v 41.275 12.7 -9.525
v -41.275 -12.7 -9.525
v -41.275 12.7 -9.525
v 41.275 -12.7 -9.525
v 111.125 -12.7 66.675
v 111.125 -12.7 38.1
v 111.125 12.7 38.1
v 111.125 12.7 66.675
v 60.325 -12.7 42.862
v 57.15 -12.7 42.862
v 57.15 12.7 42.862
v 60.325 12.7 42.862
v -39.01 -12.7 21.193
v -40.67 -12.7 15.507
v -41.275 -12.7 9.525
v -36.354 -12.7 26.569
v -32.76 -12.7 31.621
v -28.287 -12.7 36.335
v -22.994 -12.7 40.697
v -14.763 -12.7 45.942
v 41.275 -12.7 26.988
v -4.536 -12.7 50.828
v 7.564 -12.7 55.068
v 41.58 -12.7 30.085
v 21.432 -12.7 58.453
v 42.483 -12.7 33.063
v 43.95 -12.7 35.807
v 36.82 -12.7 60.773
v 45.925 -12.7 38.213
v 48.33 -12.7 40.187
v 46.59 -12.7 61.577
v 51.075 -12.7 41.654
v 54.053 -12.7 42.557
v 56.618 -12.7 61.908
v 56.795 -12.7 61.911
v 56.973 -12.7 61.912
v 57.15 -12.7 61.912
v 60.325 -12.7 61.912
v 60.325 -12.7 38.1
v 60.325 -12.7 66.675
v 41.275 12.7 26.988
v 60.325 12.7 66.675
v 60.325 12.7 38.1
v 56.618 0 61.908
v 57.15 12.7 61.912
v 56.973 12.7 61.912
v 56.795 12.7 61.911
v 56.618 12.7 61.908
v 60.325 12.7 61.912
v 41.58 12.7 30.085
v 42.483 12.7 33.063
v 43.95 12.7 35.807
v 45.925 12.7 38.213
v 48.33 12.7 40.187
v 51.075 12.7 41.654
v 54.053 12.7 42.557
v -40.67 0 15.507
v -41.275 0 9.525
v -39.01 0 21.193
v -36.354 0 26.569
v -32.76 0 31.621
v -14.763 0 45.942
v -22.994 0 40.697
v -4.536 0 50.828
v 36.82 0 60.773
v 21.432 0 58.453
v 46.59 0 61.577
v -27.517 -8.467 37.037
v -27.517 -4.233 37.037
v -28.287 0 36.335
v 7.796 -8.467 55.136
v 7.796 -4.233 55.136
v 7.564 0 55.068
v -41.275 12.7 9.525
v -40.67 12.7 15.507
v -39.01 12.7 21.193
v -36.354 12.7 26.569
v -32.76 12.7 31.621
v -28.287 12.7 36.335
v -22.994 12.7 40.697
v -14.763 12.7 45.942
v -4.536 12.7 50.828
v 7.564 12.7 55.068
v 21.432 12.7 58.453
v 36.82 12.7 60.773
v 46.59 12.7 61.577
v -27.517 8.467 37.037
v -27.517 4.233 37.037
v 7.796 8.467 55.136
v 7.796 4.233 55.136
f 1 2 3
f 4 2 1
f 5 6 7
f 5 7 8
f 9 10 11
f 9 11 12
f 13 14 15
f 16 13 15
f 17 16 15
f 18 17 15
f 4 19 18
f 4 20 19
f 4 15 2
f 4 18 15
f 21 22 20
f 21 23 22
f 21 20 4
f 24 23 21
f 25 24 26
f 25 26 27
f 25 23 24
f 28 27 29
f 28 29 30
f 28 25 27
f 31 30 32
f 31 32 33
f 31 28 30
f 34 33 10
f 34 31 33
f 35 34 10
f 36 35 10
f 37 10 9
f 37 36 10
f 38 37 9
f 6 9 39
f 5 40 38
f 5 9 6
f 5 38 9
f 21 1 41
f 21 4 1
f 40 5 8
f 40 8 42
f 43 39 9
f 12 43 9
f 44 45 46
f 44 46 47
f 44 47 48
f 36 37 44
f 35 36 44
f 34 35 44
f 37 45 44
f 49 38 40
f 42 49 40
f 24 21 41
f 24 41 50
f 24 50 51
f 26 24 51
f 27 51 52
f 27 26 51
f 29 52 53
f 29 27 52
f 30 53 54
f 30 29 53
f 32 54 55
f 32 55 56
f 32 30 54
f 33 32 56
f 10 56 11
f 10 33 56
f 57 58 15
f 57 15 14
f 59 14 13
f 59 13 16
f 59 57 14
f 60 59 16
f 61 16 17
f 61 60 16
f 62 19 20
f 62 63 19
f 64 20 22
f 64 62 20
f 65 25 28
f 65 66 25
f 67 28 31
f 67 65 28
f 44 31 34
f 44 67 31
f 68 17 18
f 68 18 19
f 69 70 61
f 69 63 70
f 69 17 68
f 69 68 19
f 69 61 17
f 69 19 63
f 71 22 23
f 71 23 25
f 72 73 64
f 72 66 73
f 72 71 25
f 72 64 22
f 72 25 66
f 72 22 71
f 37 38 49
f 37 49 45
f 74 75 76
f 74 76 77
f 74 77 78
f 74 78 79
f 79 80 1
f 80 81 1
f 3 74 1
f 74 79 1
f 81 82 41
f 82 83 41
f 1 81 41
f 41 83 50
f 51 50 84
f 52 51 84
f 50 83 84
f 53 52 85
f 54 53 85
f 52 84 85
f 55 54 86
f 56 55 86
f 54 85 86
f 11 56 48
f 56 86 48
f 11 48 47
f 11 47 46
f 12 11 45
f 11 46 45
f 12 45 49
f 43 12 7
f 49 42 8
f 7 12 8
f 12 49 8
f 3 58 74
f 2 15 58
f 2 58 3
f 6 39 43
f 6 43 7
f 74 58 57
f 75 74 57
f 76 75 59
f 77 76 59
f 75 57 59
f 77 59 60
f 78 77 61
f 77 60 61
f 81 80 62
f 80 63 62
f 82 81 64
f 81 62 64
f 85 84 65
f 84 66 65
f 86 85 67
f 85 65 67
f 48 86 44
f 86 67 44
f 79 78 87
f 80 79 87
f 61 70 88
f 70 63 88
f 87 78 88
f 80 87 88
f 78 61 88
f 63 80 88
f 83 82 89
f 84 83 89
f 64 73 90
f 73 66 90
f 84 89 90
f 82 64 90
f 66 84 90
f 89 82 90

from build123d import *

# Parameters (mm, degrees)
F0_W     = 25.4
F0_H     = 4.7625
F0_H_2   = 19.05
F1_DEPTH = 12.7


with BuildPart() as f1:
    # F0 (on Front) → F1 (new body, symmetric)
    with BuildSketch(Plane.XZ):
        Polygon((41.275, -9.525), (41.275, 9.525), (22.225, 9.525), (-41.275, 9.525), (-41.275, -9.525), align=None)
        with BuildLine():
            Line((22.225, 9.525), (41.275, 9.525))
            Line((41.275, 9.525), (41.275, 26.9875))
            ThreePointArc((41.275, 26.9875), (45.9246798487, 38.2128201513), (57.15, 42.8625))
            Line((57.15, 42.8625), (60.325, 42.8625))
            Line((60.325, 42.8625), (60.325, 61.9125))
            Line((60.325, 61.9125), (57.15, 61.9125))
            add(Edge.make_bspline(
                [(56.6181319004, 61.9084498915), (56.7953297588, 61.9100229776), (56.9726195791, 61.9113731218), (57.15, 61.9125)],
                knots=[111.1262909872, 111.1262909872, 111.1262909872, 111.1262909872, 111.4985685166, 111.4985685166, 111.4985685166, 111.4985685166], degree=3))
            ThreePointArc((56.6181319004, 61.9084498915), (32.2669624204, 51.4944391359), (22.225, 26.9875))
            Line((22.225, 26.9875), (22.225, 9.525))
        make_face()
        with BuildLine():
            Line((-41.275, 9.525), (22.225, 9.525))
            Line((22.225, 9.525), (22.225, 26.9875))
            ThreePointArc((22.225, 26.9875), (32.2669624204, 51.4944391359), (56.6181319004, 61.9084498915))
            add(Edge.make_bspline(
                [(-41.275, 9.525), (-40.9761398409, 41.1041646748), (3.723881742, 61.4388775764), (56.6181319004, 61.9084498915)],
                knots=[0, 0, 0, 0, 111.1262909872, 111.1262909872, 111.1262909872, 111.1262909872], degree=3))
        make_face()
        with BuildLine():
            ThreePointArc((57.15, 61.9125), (56.8840582401, 61.9114874582), (56.6181319004, 61.9084498915))
            add(Edge.make_bspline(
                [(56.6181319004, 61.9084498915), (56.7953297588, 61.9100229776), (56.9726195791, 61.9113731218), (57.15, 61.9125)],
                knots=[111.1262909872, 111.1262909872, 111.1262909872, 111.1262909872, 111.4985685166, 111.4985685166, 111.4985685166, 111.4985685166], degree=3))
        make_face()
        with Locations((73.025, 40.48125)):
            Rectangle(F0_W, F0_H)
        with Locations((73.025, 52.3875)):
            Rectangle(F0_W, F0_H_2)
        with Locations((73.025, 64.29375)):
            Rectangle(F0_W, F0_H)
        Polygon((85.725, 61.9125), (85.725, 42.8625), (85.725, 38.1), (111.125, 38.1), (111.125, 66.675), (85.725, 66.675), align=None)
    extrude(amount=F1_DEPTH, both=True)


solid = f1.part
